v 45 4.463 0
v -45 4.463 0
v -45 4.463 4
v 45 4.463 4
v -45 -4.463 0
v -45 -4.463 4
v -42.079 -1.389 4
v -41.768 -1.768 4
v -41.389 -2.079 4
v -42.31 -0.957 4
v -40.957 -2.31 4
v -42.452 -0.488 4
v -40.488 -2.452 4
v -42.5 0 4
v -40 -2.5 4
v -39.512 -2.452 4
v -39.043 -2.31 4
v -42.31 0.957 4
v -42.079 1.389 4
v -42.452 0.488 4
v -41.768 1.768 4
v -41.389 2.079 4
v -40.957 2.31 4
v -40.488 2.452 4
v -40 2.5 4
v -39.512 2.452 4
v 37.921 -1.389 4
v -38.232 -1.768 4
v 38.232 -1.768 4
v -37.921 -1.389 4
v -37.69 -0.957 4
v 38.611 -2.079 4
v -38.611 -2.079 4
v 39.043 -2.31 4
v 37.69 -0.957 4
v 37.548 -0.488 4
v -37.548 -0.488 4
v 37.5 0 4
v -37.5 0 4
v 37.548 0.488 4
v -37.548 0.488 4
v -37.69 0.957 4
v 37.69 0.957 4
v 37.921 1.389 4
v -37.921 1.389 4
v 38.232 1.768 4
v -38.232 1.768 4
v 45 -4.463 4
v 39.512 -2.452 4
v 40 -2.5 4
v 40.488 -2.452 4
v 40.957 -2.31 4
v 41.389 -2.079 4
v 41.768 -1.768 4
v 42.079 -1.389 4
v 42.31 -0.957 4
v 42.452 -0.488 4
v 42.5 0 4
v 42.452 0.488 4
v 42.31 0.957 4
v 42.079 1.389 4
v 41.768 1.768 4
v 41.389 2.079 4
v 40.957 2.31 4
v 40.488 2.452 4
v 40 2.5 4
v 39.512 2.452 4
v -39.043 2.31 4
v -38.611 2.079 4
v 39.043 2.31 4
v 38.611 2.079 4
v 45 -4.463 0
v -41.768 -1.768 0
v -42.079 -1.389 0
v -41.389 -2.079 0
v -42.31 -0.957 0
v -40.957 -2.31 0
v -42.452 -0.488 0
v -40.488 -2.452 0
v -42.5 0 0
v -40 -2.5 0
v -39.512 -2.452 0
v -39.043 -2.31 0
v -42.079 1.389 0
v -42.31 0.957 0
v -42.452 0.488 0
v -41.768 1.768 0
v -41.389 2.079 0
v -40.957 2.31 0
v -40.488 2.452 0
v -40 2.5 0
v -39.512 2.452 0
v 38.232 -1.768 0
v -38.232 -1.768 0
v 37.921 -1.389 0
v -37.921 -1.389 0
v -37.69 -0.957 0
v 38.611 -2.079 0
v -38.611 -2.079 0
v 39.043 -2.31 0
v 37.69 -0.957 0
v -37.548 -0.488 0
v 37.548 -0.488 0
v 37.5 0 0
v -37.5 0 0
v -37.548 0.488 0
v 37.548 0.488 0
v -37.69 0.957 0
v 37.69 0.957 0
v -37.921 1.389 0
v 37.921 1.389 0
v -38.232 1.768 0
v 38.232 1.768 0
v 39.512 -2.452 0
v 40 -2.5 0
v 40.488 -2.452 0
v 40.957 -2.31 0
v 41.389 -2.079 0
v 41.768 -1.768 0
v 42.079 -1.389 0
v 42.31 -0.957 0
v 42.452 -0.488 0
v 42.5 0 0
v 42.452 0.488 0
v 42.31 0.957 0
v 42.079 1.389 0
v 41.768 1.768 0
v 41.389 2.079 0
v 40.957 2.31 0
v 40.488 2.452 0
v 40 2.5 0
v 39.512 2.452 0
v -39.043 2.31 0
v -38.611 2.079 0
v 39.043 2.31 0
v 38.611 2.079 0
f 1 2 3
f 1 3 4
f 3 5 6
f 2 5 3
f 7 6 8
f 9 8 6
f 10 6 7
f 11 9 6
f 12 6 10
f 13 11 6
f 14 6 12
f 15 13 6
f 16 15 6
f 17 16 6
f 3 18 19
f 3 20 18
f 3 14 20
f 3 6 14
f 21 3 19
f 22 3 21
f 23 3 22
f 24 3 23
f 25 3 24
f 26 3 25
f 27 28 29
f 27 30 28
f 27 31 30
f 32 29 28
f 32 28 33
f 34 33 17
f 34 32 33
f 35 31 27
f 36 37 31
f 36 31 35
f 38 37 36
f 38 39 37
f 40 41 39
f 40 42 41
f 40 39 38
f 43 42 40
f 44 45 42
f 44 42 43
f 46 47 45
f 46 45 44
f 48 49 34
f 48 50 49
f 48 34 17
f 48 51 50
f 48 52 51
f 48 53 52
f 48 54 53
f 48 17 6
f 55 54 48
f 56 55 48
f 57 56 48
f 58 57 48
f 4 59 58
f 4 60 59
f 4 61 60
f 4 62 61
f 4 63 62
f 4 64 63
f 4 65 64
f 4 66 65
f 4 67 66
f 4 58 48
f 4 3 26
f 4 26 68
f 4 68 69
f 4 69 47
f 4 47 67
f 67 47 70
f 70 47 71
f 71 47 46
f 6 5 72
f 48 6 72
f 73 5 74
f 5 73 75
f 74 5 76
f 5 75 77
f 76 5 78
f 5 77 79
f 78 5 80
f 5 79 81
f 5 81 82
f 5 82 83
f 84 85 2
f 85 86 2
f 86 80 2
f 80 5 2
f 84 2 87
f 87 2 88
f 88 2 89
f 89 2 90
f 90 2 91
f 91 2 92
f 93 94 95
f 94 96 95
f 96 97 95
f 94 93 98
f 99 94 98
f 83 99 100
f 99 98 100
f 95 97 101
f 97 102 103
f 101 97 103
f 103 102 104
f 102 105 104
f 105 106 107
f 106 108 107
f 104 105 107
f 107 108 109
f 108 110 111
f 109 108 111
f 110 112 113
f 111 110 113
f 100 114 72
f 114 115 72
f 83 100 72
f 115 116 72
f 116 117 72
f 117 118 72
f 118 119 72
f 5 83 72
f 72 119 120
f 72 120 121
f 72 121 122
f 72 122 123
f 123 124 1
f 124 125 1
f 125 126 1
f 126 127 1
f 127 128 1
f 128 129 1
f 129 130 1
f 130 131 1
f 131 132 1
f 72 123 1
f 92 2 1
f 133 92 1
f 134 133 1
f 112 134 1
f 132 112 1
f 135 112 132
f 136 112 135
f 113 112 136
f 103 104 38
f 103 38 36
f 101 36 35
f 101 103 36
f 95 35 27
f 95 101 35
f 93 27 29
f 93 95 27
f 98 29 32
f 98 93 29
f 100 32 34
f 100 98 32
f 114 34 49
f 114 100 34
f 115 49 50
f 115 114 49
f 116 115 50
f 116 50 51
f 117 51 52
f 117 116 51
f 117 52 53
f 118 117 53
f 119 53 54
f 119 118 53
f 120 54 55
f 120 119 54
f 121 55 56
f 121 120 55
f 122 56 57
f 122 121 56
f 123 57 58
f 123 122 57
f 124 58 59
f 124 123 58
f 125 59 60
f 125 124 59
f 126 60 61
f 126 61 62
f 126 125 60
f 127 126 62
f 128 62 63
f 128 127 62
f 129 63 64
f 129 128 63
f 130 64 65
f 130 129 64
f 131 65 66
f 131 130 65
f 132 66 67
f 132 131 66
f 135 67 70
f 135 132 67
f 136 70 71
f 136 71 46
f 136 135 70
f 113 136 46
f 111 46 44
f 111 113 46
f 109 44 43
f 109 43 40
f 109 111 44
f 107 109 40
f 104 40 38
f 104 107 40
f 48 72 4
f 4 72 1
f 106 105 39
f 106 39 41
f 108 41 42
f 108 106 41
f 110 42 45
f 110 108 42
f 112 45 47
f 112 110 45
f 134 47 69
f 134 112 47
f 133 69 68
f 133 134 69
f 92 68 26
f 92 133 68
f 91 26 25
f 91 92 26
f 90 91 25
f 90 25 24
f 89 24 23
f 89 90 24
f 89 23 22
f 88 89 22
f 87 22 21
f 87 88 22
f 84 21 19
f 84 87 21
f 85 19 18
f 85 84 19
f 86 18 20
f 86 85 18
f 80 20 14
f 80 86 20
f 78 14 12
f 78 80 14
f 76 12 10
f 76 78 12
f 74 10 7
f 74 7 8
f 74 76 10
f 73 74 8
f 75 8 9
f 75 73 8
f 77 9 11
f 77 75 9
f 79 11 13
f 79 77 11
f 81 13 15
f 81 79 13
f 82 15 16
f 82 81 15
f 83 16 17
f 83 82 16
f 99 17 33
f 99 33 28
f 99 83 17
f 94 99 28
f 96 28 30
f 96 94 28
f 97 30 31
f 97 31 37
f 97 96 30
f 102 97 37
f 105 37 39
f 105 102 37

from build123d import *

# Parameters (mm, degrees)
ESQUISSE1_W = 90
ESQUISSE1_H = 8.926229508
ESQUISSE1_R = 2.5
BASE_DEPTH  = 4


with BuildPart() as part:
    # Esquisse1 → BASE (new body)
    with BuildSketch(Plane.XY):
        Rectangle(ESQUISSE1_W, ESQUISSE1_H)
        with Locations((-40, 0)):
            Circle(ESQUISSE1_R, mode=Mode.SUBTRACT)
        with Locations(Location((40, 0, 0), (0, 0, 180))):
            Circle(ESQUISSE1_R, mode=Mode.SUBTRACT)
    extrude(amount=BASE_DEPTH)


solid = part.part
